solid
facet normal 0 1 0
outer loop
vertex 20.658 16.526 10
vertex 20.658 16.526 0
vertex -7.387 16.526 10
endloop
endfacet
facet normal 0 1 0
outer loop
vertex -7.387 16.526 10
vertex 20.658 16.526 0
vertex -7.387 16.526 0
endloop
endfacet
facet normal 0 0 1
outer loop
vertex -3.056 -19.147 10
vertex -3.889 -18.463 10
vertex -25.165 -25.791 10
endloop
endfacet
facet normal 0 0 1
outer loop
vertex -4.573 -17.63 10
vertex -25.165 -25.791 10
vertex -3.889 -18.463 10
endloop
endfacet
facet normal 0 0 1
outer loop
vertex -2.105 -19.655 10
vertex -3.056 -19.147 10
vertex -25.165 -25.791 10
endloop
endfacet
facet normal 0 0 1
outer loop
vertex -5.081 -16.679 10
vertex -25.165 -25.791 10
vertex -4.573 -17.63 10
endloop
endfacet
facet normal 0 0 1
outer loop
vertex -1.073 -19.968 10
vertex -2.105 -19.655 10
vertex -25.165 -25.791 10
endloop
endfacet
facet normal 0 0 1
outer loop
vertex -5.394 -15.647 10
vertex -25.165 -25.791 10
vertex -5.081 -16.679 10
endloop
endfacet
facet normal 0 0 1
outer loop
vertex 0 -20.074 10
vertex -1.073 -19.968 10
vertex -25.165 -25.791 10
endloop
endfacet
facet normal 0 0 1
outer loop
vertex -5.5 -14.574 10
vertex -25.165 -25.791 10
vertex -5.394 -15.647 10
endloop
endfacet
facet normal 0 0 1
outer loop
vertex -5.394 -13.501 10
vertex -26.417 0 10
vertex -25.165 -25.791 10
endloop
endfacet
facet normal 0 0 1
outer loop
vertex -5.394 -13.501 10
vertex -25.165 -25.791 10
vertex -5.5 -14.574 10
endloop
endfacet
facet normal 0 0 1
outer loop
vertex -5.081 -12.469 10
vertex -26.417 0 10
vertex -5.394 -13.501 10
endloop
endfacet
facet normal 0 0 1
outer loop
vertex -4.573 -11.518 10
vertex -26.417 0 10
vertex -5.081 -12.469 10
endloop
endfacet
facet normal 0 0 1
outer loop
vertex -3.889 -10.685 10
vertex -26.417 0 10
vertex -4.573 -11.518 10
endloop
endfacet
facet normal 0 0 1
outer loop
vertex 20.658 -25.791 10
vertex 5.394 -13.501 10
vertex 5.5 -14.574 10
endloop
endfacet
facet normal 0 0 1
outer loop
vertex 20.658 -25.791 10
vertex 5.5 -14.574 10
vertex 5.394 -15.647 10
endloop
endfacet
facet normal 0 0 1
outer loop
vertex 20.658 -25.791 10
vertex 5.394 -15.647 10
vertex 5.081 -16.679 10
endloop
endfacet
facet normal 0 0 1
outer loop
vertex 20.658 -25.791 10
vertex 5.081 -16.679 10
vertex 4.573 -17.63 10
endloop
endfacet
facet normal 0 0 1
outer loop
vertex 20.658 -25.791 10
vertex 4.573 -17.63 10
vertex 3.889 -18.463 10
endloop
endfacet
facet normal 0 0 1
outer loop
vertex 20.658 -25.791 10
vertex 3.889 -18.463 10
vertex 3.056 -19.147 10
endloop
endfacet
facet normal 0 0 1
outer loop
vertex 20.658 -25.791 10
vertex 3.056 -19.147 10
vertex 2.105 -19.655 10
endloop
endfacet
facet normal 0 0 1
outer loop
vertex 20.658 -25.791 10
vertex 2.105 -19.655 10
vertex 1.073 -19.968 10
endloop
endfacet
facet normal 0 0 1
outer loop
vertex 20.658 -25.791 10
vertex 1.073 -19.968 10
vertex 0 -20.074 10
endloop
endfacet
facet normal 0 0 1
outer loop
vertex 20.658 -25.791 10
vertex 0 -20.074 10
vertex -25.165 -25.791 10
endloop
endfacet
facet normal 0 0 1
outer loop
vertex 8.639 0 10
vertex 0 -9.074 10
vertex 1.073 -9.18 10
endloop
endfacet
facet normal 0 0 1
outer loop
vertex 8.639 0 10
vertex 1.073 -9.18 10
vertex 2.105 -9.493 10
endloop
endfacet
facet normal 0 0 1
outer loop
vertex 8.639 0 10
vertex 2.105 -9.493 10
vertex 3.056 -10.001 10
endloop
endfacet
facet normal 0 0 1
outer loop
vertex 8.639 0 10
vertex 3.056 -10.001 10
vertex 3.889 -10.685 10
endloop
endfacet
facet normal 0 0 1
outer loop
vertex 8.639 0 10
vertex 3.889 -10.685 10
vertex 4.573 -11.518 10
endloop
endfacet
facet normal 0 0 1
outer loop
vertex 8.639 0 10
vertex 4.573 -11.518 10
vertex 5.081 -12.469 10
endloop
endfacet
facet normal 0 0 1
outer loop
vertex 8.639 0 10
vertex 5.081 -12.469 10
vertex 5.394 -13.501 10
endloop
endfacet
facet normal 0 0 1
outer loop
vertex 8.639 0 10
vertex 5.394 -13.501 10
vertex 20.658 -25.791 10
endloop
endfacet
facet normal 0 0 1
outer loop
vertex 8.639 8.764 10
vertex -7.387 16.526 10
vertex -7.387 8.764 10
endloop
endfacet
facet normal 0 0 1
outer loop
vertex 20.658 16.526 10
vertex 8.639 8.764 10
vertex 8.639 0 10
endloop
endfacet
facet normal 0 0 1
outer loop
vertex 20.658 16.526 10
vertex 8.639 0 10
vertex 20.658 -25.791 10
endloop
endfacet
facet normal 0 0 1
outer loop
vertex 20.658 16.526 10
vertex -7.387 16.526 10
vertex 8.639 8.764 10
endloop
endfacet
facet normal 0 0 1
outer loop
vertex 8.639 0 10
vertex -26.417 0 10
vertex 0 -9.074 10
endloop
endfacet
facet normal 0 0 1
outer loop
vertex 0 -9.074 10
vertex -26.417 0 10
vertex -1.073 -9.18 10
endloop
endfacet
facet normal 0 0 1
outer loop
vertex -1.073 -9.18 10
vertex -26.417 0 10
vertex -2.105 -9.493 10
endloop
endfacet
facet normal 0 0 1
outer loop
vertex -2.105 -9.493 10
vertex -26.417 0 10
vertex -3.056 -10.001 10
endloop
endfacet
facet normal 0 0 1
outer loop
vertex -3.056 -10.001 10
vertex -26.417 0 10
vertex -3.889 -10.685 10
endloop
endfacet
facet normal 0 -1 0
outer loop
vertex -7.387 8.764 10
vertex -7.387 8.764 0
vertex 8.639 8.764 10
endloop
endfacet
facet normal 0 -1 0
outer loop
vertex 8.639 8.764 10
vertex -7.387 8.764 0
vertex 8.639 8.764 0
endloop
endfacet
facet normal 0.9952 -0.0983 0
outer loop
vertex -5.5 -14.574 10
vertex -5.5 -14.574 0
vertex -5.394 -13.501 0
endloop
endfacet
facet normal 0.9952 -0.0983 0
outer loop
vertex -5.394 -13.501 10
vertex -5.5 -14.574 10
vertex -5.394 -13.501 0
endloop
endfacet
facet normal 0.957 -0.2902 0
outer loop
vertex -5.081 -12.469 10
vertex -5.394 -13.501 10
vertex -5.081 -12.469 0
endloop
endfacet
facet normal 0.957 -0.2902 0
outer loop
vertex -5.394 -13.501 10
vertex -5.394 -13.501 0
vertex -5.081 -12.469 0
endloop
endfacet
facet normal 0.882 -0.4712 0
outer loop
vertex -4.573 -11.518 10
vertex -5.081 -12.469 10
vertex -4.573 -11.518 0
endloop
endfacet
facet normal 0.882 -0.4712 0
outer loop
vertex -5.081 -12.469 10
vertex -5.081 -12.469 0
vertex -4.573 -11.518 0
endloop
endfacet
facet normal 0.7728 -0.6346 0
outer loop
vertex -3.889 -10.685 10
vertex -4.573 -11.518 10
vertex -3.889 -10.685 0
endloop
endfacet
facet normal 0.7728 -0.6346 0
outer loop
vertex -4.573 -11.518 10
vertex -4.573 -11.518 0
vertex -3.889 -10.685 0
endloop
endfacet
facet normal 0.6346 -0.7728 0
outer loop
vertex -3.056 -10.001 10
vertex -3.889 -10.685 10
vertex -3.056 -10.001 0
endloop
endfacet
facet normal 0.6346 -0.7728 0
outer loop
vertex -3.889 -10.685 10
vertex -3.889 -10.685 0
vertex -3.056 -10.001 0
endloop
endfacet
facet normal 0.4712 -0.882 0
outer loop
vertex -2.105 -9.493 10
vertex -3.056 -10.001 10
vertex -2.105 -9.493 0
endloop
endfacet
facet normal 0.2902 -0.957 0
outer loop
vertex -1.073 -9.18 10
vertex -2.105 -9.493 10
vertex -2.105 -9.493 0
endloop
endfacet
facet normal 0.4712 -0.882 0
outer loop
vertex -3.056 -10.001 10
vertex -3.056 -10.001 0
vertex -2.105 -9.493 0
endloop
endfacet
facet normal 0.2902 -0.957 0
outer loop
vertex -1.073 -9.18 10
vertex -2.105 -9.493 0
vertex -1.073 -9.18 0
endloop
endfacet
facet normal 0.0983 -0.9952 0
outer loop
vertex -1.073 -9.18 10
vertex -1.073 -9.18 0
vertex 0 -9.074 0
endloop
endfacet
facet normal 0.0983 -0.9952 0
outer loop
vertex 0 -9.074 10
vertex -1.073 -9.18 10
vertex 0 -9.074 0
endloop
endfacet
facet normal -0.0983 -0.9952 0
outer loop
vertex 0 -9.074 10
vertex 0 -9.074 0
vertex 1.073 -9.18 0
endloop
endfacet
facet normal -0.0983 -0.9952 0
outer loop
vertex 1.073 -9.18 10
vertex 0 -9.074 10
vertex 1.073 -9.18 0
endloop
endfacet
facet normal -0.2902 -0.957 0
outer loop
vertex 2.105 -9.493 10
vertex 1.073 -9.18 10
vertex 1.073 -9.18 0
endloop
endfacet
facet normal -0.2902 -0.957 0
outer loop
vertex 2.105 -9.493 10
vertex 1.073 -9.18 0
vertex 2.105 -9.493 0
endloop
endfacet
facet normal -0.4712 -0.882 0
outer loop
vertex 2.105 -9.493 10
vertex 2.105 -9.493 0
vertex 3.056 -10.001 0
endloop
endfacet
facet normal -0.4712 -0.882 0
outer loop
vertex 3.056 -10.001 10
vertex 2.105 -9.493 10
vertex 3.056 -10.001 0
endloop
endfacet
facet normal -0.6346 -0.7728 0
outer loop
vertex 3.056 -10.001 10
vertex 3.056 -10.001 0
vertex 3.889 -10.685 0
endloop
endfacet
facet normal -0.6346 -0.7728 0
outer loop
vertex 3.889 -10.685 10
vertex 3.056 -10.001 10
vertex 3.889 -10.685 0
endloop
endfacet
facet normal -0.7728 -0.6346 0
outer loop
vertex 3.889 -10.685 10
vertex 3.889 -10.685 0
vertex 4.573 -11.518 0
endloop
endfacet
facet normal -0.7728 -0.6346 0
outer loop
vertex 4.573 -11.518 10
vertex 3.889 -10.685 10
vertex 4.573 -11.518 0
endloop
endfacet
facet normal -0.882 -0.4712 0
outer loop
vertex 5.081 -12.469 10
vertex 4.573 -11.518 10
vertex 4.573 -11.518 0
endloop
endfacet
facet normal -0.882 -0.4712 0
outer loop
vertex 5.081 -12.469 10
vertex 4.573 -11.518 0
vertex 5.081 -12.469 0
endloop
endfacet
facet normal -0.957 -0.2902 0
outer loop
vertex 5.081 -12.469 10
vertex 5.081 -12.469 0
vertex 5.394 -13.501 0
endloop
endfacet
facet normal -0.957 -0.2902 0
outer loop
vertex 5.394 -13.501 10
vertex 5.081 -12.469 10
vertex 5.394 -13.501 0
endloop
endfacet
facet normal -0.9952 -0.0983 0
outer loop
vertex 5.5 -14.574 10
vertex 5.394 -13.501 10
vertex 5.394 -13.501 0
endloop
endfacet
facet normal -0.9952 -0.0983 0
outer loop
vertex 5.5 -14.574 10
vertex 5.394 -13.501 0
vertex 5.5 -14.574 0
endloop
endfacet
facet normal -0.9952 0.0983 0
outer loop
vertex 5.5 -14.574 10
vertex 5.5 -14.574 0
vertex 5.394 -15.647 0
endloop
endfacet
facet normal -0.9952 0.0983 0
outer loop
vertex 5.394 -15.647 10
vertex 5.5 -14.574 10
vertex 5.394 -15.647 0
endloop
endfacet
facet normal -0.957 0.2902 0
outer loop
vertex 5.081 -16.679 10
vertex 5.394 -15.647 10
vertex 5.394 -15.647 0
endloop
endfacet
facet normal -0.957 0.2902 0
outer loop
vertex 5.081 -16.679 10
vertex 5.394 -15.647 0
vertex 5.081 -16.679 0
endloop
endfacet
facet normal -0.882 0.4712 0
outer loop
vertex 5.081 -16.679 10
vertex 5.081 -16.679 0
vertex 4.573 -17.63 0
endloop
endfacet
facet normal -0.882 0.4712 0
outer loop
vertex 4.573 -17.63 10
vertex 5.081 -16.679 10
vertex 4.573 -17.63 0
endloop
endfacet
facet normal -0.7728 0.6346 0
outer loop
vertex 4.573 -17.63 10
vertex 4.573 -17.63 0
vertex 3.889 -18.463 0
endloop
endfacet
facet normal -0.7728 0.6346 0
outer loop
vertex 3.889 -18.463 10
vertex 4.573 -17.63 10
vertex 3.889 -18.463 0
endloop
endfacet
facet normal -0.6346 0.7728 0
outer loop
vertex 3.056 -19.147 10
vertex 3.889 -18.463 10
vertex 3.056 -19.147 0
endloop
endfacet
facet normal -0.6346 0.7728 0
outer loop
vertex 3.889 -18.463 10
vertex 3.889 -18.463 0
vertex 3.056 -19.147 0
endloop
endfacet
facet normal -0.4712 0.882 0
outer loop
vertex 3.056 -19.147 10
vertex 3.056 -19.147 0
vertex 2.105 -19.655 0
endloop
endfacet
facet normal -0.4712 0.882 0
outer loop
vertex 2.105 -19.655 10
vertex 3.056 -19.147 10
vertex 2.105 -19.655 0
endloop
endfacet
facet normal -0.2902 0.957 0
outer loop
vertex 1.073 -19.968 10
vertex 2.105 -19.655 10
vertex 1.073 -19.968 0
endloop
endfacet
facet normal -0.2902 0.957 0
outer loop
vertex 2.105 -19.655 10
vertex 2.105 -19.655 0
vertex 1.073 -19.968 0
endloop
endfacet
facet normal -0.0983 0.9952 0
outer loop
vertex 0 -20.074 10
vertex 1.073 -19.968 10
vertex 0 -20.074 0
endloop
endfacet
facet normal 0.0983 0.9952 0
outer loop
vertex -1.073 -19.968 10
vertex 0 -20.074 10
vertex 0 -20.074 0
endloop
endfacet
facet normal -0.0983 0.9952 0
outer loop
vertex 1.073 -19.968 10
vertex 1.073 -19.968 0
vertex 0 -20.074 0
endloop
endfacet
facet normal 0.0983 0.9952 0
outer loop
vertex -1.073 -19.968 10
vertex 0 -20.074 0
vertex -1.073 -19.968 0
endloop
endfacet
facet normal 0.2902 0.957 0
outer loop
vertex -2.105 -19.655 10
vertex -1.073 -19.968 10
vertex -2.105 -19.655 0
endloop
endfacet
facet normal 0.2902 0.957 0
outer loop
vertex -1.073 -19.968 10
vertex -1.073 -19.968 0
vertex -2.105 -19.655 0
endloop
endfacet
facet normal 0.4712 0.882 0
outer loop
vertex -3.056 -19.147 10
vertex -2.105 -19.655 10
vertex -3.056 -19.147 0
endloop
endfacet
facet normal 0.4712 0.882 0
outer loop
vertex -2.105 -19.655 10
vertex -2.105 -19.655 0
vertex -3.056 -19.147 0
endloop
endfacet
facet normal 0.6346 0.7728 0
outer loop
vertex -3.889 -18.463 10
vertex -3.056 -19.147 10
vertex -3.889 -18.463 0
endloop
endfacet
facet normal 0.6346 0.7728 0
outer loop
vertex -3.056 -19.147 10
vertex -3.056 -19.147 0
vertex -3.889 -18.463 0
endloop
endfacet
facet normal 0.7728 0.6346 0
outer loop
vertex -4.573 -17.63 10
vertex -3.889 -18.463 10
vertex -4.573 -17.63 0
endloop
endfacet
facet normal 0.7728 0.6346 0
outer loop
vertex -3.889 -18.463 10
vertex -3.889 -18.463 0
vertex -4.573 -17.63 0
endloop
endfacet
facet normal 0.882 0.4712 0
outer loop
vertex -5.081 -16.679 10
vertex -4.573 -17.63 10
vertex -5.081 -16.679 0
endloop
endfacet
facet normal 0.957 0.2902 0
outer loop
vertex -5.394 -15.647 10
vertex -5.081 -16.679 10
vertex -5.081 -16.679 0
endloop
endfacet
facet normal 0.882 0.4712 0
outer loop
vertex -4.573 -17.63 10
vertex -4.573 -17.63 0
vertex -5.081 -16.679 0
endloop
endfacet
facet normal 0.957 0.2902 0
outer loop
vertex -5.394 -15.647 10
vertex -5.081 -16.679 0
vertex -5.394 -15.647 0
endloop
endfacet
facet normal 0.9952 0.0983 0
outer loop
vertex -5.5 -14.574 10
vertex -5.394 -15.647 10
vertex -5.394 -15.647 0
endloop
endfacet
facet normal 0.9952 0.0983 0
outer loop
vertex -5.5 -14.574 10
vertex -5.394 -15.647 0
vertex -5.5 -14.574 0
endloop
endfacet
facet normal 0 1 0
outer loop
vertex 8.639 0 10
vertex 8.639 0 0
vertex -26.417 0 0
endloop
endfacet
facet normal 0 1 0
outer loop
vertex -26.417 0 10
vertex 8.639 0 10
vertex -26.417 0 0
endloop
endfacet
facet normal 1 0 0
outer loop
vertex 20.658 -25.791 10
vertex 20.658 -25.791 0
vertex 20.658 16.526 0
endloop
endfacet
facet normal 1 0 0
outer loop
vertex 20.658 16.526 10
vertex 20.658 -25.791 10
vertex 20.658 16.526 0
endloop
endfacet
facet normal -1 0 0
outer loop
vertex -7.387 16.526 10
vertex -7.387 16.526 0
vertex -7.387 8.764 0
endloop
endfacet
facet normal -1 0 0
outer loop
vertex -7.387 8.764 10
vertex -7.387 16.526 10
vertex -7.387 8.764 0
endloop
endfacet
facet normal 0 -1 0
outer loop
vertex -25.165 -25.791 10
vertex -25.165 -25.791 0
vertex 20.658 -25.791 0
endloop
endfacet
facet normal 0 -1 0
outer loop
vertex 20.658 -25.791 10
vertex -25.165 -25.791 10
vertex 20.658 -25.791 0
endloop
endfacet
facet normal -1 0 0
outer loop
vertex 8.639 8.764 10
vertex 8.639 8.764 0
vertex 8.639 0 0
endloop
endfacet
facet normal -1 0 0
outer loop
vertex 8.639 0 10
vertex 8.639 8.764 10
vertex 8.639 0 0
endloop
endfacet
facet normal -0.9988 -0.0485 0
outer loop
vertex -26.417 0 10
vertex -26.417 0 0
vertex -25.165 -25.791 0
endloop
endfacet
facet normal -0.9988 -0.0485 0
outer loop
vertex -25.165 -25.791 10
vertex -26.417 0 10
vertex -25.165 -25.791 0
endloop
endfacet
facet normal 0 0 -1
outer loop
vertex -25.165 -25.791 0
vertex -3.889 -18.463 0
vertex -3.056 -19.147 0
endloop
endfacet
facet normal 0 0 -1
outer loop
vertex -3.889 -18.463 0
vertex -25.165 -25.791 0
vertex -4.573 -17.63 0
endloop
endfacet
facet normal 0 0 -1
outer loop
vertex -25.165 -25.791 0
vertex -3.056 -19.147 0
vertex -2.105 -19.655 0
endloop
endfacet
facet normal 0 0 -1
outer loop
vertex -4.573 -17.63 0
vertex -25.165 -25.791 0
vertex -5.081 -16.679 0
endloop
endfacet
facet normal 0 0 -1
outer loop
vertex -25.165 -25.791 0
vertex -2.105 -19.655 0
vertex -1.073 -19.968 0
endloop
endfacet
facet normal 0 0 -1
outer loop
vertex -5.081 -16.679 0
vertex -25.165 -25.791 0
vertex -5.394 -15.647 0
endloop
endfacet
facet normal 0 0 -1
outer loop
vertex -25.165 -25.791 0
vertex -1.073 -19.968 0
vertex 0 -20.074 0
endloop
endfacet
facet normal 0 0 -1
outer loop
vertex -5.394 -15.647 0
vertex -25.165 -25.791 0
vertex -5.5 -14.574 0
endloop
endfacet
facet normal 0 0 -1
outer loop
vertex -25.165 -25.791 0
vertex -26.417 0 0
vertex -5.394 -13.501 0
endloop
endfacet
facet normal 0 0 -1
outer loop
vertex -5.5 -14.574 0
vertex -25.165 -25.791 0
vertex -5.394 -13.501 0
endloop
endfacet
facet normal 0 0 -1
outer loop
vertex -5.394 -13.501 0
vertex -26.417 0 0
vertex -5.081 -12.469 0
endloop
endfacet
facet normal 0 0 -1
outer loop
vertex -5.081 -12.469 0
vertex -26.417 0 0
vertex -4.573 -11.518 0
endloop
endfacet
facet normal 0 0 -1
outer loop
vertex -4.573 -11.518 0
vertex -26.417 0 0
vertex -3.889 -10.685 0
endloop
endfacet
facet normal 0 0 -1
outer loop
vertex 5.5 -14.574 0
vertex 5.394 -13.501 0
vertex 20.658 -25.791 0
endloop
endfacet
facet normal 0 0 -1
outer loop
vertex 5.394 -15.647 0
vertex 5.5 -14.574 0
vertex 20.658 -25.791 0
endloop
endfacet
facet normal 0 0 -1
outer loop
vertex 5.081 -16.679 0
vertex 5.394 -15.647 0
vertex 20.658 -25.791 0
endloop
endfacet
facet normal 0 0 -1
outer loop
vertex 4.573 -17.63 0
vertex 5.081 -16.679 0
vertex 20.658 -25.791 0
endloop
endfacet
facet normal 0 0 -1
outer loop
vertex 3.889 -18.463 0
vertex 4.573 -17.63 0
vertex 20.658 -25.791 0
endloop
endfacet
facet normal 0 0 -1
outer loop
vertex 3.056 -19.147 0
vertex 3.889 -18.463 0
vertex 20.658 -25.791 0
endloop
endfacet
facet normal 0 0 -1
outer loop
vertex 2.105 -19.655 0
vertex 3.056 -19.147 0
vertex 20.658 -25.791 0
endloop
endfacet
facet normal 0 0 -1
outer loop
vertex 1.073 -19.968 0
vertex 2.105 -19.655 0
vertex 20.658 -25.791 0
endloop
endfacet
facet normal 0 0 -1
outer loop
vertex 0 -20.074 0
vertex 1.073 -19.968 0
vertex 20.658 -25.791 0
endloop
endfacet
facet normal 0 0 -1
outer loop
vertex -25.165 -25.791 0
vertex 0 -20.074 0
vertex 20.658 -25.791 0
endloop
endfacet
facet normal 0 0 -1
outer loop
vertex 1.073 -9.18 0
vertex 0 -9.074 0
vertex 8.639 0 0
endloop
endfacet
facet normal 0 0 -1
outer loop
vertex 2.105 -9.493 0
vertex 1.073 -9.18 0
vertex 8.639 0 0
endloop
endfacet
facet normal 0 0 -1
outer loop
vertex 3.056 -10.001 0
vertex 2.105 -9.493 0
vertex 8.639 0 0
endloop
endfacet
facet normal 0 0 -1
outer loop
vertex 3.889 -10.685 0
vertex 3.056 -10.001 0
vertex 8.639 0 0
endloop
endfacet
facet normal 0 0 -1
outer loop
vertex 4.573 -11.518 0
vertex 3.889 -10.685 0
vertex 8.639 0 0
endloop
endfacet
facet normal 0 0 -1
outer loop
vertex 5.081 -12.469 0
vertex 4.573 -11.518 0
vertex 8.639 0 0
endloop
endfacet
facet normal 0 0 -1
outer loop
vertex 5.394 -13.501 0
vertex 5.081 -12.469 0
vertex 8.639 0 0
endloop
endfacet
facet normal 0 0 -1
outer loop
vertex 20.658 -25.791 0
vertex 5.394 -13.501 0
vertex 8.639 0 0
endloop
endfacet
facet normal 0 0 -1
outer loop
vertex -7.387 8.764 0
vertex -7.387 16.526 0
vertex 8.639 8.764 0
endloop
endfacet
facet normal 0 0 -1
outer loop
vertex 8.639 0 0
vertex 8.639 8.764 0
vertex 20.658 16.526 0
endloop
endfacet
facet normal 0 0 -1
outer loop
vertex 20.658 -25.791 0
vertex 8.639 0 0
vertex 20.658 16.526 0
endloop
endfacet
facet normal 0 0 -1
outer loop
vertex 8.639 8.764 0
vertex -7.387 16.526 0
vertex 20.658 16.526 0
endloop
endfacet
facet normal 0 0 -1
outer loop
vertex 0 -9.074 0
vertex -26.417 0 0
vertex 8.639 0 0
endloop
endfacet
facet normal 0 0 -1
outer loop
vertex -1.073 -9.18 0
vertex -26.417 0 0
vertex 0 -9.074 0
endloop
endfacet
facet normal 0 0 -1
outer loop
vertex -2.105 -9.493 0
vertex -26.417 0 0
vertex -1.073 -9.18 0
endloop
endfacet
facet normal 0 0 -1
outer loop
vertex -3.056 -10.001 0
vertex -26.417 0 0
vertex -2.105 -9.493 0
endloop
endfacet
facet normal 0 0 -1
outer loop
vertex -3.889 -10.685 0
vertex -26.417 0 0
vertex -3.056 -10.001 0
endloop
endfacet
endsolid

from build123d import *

# Parameters (mm, degrees)
F1_DEPTH = 10
F3_D     = 11


with BuildPart() as f1:
    # F0 (on Top) → F1 (new body)
    with BuildSketch(Plane.XY):
        Polygon((-26.416933, 0), (-25.164945, -25.790939), (20.657791, -25.790939), (20.657791, 16.526233), (-7.386724, 16.526233), (-7.386724, 8.763911), (8.638713, 8.763911), (8.638713, 0), (0, 0), align=None)
    extrude(amount=F1_DEPTH)

    # F3 (through all)
    with Locations(Plane.XY.offset(10)):
        with Locations((0, -14.57391)):
            Hole(F3_D / 2)


solid = f1.part
